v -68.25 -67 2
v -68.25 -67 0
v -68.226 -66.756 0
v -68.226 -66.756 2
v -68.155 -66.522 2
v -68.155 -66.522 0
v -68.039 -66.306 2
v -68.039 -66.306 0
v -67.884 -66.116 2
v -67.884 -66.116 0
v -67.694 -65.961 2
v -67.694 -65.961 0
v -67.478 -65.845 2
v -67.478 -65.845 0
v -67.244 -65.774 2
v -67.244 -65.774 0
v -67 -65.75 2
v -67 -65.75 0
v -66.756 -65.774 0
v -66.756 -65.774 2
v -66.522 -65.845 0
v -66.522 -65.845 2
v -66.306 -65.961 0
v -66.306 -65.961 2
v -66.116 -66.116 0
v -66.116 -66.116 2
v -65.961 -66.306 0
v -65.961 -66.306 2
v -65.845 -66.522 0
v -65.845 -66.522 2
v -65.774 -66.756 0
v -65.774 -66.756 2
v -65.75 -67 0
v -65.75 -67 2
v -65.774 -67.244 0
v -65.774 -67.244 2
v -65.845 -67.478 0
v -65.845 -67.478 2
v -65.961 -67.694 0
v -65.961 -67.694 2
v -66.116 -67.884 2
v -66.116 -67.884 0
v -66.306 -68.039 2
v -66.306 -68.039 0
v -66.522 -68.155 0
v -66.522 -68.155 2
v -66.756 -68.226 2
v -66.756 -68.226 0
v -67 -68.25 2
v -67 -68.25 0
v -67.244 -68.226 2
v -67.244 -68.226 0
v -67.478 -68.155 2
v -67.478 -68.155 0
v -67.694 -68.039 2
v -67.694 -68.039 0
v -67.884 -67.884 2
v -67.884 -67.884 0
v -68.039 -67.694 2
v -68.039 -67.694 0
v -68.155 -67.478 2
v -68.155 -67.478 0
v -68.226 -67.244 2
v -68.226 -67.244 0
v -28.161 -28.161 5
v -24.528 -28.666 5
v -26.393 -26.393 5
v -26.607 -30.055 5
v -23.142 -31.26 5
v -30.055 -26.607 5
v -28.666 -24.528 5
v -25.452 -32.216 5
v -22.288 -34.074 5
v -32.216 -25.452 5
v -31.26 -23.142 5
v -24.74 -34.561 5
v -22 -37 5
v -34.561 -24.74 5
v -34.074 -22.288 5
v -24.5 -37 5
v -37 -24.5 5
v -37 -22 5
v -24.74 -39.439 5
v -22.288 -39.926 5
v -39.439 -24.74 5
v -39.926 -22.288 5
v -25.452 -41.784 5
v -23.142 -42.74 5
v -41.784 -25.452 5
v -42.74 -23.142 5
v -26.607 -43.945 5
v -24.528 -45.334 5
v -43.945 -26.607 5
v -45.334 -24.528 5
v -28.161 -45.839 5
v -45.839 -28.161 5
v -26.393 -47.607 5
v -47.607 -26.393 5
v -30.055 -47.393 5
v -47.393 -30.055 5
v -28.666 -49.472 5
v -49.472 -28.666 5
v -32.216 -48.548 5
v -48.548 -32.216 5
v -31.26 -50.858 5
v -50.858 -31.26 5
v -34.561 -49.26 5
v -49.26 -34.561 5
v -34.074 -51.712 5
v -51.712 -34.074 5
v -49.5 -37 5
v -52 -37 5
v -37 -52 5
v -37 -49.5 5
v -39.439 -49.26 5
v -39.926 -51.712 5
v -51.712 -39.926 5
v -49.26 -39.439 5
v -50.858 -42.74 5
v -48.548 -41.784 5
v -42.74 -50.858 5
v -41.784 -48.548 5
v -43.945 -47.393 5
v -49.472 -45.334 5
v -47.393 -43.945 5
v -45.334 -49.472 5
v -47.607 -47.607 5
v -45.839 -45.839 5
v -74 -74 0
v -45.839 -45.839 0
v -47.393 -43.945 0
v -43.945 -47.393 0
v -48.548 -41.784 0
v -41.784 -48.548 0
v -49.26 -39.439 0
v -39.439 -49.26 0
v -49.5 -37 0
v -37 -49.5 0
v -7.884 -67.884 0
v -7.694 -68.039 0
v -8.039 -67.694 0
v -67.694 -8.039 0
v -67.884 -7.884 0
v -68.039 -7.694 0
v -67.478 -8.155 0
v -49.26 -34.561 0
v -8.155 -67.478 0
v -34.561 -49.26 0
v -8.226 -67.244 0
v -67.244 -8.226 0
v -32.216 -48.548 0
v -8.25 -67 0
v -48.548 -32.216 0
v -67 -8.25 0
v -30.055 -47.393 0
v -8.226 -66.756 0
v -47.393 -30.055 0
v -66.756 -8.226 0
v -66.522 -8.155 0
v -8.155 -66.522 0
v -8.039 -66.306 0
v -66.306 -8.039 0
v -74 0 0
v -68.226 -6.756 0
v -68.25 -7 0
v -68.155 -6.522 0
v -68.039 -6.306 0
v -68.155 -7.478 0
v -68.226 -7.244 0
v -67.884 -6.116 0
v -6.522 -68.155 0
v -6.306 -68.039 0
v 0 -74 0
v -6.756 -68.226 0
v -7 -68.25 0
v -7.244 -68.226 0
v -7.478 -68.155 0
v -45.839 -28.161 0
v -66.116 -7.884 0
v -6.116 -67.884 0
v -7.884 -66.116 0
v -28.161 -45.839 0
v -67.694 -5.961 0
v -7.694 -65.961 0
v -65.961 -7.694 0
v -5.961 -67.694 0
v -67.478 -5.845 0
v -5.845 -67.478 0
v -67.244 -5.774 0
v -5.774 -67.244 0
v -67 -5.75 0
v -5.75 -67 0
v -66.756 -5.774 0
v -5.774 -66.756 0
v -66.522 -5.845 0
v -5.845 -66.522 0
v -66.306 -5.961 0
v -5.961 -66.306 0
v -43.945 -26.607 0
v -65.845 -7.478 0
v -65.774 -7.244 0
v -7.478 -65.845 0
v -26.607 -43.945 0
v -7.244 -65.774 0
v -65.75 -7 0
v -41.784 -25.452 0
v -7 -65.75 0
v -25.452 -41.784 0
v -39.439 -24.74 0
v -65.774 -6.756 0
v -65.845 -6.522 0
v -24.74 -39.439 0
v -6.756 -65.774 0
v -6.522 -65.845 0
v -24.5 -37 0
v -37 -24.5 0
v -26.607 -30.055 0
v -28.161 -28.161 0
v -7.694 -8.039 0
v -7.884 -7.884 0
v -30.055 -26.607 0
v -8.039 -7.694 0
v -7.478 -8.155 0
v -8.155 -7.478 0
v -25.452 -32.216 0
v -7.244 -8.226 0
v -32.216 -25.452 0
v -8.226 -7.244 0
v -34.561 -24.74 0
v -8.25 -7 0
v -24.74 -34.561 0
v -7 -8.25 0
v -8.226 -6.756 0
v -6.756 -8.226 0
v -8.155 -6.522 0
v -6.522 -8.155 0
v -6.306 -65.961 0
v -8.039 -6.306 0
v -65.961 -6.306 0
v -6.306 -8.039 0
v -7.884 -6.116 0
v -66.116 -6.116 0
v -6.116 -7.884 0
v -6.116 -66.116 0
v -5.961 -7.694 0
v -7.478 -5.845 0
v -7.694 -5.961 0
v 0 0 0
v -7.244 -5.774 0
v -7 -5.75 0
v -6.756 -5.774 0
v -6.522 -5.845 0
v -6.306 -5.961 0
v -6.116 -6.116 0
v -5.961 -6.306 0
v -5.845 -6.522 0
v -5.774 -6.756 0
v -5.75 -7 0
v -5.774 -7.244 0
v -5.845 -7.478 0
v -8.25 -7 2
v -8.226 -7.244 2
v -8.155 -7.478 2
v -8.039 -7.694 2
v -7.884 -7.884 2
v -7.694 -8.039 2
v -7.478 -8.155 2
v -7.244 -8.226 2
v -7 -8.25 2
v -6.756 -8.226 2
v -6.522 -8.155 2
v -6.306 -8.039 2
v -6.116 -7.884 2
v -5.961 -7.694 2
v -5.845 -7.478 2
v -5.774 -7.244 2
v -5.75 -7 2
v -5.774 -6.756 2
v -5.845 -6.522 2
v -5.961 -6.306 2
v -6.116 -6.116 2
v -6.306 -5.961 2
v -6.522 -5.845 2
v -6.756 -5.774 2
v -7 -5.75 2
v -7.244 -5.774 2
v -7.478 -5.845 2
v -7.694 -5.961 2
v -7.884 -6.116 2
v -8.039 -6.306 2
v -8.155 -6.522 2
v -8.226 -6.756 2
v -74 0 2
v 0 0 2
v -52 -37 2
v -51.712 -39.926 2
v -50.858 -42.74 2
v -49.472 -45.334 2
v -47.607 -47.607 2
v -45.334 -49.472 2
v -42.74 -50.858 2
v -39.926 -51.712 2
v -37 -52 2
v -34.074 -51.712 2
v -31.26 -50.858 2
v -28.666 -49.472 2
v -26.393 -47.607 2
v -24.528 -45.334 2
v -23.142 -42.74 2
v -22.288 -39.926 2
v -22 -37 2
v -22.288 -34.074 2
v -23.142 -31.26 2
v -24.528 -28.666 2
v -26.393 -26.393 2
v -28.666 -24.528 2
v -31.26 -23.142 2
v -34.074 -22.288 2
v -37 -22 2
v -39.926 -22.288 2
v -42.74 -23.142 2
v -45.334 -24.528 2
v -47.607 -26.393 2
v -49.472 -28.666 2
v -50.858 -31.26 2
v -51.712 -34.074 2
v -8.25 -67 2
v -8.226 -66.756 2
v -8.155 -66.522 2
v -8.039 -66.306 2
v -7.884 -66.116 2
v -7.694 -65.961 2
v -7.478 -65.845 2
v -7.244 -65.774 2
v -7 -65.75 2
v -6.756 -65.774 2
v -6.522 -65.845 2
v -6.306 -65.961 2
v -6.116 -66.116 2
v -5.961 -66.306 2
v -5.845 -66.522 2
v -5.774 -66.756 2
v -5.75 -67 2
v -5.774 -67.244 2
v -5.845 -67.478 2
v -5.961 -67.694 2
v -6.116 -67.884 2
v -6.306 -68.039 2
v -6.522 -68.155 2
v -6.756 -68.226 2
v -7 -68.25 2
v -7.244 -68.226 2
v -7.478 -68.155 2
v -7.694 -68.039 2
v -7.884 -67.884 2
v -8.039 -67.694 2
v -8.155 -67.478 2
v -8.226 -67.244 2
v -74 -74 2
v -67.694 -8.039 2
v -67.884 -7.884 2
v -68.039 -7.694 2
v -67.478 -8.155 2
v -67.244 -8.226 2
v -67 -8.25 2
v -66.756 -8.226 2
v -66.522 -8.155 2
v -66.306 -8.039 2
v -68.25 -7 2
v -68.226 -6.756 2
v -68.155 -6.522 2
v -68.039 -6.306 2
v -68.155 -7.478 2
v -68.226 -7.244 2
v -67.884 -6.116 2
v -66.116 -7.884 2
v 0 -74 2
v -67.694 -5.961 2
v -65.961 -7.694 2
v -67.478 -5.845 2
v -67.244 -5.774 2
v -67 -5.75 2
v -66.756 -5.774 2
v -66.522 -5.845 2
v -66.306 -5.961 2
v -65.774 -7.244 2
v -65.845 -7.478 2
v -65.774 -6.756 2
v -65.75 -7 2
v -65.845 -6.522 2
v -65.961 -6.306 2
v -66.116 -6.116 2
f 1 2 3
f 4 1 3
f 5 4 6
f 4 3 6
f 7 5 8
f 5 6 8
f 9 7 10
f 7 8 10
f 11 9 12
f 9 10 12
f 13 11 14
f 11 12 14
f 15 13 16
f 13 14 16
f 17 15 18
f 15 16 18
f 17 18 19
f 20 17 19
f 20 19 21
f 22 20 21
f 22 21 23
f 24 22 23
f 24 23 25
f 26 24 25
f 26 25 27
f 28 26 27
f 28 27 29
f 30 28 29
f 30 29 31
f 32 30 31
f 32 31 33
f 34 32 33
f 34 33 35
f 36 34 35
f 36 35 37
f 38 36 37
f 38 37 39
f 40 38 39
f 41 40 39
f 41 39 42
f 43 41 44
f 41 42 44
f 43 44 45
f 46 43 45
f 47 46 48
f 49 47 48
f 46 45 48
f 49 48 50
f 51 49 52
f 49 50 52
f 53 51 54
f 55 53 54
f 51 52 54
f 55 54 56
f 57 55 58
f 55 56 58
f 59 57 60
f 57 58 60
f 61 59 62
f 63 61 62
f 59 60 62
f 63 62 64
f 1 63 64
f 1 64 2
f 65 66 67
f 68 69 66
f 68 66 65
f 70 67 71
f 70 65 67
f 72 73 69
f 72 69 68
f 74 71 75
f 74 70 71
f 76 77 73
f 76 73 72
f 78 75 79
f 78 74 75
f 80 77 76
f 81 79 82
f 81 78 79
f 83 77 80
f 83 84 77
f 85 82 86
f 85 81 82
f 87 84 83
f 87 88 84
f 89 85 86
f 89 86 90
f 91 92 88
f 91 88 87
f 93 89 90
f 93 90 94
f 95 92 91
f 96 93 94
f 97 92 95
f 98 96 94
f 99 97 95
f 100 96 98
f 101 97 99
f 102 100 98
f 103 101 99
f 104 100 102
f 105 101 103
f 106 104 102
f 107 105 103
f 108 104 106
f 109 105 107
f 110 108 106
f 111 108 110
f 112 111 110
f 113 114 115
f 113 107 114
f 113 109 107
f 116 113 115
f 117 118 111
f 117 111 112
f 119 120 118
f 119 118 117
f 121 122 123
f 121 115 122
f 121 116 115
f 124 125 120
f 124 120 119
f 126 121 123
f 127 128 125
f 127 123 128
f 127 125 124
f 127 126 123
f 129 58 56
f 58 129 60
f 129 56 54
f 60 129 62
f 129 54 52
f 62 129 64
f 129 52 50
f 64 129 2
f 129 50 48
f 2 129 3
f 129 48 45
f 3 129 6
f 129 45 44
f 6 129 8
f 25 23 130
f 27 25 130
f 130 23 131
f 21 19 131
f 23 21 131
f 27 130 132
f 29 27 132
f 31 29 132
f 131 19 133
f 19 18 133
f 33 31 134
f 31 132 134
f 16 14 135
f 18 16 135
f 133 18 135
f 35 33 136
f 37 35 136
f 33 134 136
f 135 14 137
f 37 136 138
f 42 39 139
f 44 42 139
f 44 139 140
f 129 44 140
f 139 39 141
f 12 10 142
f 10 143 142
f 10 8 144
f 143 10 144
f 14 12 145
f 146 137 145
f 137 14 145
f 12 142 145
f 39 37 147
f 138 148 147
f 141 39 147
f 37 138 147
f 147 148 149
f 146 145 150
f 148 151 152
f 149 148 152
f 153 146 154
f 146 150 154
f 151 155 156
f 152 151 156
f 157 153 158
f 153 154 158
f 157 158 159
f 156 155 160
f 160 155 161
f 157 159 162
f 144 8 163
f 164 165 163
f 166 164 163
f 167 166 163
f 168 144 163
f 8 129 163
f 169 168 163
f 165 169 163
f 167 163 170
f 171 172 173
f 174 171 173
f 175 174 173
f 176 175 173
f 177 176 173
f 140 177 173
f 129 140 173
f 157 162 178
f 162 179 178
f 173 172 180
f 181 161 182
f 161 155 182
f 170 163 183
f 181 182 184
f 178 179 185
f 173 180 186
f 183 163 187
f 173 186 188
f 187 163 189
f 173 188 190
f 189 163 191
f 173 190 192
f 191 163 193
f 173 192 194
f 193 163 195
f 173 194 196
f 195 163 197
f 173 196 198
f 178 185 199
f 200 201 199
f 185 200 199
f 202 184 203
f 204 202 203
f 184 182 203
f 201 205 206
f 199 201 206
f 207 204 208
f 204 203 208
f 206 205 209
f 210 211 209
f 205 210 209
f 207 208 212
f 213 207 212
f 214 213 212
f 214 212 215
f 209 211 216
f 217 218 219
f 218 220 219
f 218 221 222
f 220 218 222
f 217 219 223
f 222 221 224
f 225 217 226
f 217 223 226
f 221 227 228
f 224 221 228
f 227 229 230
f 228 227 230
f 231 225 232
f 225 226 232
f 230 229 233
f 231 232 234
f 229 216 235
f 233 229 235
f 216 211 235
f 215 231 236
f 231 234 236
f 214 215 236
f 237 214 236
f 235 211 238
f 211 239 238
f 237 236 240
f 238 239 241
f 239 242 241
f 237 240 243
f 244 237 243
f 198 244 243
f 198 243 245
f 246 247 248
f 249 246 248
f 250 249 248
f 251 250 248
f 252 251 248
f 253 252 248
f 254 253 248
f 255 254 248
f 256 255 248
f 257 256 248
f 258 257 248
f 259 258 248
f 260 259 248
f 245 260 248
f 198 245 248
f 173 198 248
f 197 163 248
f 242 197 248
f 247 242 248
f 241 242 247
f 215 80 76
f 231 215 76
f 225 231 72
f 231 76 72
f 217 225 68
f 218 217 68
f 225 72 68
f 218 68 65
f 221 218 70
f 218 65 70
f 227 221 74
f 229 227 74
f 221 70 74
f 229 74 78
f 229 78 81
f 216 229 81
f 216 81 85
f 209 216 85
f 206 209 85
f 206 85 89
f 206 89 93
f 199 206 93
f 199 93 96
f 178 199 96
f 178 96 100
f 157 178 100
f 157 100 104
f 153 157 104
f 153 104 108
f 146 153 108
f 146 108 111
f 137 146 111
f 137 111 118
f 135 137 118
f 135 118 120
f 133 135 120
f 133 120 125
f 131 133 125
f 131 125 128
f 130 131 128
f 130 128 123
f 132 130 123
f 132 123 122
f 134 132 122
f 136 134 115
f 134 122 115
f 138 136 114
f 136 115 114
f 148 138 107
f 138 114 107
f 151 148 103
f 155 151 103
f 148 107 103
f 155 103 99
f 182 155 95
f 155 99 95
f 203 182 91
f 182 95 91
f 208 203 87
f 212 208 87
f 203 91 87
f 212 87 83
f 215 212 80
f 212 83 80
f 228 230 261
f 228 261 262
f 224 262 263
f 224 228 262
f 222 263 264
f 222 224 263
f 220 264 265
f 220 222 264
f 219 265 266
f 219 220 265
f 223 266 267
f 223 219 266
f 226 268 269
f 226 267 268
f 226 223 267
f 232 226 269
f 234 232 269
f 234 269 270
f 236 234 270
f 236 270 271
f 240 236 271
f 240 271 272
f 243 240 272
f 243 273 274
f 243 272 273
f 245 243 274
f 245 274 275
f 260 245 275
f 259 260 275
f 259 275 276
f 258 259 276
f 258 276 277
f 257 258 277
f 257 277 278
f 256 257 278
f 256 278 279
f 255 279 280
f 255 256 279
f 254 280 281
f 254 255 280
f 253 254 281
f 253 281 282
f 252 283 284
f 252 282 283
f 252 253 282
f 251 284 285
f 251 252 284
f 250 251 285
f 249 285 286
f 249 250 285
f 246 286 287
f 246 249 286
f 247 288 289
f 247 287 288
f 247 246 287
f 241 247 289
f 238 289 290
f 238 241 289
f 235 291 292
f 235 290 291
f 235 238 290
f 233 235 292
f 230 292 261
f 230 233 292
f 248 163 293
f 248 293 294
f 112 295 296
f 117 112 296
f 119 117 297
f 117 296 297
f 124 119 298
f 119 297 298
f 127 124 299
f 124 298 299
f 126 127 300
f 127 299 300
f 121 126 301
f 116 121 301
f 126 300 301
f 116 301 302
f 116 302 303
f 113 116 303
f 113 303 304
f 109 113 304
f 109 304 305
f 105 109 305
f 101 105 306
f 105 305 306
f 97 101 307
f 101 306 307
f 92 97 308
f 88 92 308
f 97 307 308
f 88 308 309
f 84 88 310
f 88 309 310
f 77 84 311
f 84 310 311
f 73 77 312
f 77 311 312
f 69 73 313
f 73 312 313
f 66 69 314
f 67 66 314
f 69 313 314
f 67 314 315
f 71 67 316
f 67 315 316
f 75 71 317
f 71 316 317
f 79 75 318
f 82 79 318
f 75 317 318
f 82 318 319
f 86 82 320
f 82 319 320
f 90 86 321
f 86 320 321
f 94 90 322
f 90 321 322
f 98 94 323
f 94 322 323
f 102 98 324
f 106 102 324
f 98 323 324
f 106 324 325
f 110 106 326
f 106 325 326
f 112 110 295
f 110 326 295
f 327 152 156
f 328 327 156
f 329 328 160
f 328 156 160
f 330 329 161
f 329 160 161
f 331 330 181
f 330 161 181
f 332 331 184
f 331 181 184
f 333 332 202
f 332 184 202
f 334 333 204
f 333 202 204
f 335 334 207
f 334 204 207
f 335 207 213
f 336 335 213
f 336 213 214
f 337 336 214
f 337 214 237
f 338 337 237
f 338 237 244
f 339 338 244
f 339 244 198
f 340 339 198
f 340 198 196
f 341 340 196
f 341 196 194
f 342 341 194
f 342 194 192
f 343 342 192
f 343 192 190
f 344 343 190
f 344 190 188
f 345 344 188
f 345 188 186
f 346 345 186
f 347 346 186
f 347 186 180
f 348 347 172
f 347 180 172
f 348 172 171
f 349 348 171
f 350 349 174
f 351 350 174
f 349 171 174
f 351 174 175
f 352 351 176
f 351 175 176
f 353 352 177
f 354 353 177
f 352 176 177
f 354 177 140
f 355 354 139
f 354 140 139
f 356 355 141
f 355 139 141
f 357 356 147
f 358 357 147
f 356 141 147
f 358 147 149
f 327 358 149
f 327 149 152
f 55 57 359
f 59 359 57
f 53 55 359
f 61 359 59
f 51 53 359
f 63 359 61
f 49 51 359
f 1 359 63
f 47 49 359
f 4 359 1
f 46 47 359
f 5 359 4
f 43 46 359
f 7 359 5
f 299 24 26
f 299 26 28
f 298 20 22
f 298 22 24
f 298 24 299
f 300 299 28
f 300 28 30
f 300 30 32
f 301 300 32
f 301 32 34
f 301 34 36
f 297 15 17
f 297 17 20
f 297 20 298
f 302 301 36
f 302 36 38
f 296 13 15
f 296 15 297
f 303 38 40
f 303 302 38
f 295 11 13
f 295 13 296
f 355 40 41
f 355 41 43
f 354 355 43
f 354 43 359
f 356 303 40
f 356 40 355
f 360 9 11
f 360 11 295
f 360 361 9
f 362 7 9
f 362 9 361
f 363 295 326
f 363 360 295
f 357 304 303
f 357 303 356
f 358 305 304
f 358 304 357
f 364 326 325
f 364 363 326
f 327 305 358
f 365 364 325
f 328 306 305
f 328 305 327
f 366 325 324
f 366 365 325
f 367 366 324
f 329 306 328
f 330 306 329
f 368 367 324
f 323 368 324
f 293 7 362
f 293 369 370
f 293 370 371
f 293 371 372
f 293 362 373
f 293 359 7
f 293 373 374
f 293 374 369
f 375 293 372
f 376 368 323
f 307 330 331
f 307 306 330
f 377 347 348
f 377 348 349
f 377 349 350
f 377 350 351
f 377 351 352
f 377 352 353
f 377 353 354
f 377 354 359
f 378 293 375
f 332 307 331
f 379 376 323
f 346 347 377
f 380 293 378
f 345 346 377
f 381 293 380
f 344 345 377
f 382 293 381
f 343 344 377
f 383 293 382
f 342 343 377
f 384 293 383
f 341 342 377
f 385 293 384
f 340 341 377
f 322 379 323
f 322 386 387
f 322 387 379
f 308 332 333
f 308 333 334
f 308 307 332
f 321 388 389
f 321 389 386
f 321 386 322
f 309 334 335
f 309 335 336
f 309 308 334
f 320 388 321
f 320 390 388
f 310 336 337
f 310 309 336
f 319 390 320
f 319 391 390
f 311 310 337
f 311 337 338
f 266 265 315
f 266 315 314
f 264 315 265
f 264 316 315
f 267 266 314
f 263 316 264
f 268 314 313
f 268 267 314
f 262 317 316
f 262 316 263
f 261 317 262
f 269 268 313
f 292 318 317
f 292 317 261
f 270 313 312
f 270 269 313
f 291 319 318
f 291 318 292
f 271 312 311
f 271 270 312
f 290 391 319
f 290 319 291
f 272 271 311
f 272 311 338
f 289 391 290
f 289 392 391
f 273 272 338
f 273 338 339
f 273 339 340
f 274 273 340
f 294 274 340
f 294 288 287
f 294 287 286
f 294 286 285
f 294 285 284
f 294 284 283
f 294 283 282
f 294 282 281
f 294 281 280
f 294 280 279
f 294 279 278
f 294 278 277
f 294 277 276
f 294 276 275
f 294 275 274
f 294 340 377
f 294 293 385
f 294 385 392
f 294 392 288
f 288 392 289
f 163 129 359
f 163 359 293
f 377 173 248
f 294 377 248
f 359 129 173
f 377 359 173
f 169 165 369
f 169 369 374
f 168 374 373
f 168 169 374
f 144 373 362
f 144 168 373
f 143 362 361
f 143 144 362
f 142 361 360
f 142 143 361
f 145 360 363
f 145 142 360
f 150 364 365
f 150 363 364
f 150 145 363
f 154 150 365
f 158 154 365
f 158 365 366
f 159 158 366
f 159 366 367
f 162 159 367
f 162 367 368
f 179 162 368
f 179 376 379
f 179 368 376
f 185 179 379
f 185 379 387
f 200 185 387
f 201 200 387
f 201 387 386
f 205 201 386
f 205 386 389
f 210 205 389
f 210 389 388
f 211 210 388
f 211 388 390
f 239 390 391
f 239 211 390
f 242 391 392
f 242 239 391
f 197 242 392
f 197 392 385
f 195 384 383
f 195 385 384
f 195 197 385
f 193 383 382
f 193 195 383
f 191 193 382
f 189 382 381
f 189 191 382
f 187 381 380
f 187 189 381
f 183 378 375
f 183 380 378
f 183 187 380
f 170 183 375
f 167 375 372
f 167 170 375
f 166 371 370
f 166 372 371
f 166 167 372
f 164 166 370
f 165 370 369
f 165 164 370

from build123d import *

# Parameters (mm, degrees)
SKETCH_2_W          = 74
SKETCH_2_H          = 74
EXTRUDE_1_DEPTH     = 2
SKETCH_3_R          = 15
EXTRUDE_2_DEPTH     = 3
SKETCH_4_R          = 12.5
CUT_EXTRUDE_1_DEPTH = 10
M3X0_5_1_D          = 2.5


with BuildPart() as part:
    # ｽｹｯﾁ2 → ﾎﾞｽ - 押し出し1 (new body)
    with BuildSketch(Plane.XY):
        with Locations((-37, -37)):
            Rectangle(SKETCH_2_W, SKETCH_2_H)
    extrude(amount=EXTRUDE_1_DEPTH)

    # ｽｹｯﾁ3 → ﾎﾞｽ - 押し出し2 (add)
    with BuildSketch(Plane.XY.offset(2)):
        with Locations(Location((-37, -37, 0), (0, 0, 180))):
            Circle(SKETCH_3_R)
    extrude(amount=EXTRUDE_2_DEPTH)

    # ｽｹｯﾁ4 → ｶｯﾄ - 押し出し1 (cut)
    with BuildSketch(Plane.XY.offset(5)):
        with Locations((-37, -37)):
            Circle(SKETCH_4_R)
    extrude(amount=-CUT_EXTRUDE_1_DEPTH, mode=Mode.SUBTRACT)

    # M3x0.5 ねじ穴1 (through all)
    with Locations(Plane.XY.offset(2)):
        with Locations((-67, -67), (-7, -67)):
            m3x0_5_1 = Hole(M3X0_5_1_D / 2)

    # ﾐﾗｰ1: M3x0.5 ねじ穴1 across plane
    add(m3x0_5_1.mirror(Plane.ZX.offset(-37)), mode=Mode.SUBTRACT)


solid = part.part
